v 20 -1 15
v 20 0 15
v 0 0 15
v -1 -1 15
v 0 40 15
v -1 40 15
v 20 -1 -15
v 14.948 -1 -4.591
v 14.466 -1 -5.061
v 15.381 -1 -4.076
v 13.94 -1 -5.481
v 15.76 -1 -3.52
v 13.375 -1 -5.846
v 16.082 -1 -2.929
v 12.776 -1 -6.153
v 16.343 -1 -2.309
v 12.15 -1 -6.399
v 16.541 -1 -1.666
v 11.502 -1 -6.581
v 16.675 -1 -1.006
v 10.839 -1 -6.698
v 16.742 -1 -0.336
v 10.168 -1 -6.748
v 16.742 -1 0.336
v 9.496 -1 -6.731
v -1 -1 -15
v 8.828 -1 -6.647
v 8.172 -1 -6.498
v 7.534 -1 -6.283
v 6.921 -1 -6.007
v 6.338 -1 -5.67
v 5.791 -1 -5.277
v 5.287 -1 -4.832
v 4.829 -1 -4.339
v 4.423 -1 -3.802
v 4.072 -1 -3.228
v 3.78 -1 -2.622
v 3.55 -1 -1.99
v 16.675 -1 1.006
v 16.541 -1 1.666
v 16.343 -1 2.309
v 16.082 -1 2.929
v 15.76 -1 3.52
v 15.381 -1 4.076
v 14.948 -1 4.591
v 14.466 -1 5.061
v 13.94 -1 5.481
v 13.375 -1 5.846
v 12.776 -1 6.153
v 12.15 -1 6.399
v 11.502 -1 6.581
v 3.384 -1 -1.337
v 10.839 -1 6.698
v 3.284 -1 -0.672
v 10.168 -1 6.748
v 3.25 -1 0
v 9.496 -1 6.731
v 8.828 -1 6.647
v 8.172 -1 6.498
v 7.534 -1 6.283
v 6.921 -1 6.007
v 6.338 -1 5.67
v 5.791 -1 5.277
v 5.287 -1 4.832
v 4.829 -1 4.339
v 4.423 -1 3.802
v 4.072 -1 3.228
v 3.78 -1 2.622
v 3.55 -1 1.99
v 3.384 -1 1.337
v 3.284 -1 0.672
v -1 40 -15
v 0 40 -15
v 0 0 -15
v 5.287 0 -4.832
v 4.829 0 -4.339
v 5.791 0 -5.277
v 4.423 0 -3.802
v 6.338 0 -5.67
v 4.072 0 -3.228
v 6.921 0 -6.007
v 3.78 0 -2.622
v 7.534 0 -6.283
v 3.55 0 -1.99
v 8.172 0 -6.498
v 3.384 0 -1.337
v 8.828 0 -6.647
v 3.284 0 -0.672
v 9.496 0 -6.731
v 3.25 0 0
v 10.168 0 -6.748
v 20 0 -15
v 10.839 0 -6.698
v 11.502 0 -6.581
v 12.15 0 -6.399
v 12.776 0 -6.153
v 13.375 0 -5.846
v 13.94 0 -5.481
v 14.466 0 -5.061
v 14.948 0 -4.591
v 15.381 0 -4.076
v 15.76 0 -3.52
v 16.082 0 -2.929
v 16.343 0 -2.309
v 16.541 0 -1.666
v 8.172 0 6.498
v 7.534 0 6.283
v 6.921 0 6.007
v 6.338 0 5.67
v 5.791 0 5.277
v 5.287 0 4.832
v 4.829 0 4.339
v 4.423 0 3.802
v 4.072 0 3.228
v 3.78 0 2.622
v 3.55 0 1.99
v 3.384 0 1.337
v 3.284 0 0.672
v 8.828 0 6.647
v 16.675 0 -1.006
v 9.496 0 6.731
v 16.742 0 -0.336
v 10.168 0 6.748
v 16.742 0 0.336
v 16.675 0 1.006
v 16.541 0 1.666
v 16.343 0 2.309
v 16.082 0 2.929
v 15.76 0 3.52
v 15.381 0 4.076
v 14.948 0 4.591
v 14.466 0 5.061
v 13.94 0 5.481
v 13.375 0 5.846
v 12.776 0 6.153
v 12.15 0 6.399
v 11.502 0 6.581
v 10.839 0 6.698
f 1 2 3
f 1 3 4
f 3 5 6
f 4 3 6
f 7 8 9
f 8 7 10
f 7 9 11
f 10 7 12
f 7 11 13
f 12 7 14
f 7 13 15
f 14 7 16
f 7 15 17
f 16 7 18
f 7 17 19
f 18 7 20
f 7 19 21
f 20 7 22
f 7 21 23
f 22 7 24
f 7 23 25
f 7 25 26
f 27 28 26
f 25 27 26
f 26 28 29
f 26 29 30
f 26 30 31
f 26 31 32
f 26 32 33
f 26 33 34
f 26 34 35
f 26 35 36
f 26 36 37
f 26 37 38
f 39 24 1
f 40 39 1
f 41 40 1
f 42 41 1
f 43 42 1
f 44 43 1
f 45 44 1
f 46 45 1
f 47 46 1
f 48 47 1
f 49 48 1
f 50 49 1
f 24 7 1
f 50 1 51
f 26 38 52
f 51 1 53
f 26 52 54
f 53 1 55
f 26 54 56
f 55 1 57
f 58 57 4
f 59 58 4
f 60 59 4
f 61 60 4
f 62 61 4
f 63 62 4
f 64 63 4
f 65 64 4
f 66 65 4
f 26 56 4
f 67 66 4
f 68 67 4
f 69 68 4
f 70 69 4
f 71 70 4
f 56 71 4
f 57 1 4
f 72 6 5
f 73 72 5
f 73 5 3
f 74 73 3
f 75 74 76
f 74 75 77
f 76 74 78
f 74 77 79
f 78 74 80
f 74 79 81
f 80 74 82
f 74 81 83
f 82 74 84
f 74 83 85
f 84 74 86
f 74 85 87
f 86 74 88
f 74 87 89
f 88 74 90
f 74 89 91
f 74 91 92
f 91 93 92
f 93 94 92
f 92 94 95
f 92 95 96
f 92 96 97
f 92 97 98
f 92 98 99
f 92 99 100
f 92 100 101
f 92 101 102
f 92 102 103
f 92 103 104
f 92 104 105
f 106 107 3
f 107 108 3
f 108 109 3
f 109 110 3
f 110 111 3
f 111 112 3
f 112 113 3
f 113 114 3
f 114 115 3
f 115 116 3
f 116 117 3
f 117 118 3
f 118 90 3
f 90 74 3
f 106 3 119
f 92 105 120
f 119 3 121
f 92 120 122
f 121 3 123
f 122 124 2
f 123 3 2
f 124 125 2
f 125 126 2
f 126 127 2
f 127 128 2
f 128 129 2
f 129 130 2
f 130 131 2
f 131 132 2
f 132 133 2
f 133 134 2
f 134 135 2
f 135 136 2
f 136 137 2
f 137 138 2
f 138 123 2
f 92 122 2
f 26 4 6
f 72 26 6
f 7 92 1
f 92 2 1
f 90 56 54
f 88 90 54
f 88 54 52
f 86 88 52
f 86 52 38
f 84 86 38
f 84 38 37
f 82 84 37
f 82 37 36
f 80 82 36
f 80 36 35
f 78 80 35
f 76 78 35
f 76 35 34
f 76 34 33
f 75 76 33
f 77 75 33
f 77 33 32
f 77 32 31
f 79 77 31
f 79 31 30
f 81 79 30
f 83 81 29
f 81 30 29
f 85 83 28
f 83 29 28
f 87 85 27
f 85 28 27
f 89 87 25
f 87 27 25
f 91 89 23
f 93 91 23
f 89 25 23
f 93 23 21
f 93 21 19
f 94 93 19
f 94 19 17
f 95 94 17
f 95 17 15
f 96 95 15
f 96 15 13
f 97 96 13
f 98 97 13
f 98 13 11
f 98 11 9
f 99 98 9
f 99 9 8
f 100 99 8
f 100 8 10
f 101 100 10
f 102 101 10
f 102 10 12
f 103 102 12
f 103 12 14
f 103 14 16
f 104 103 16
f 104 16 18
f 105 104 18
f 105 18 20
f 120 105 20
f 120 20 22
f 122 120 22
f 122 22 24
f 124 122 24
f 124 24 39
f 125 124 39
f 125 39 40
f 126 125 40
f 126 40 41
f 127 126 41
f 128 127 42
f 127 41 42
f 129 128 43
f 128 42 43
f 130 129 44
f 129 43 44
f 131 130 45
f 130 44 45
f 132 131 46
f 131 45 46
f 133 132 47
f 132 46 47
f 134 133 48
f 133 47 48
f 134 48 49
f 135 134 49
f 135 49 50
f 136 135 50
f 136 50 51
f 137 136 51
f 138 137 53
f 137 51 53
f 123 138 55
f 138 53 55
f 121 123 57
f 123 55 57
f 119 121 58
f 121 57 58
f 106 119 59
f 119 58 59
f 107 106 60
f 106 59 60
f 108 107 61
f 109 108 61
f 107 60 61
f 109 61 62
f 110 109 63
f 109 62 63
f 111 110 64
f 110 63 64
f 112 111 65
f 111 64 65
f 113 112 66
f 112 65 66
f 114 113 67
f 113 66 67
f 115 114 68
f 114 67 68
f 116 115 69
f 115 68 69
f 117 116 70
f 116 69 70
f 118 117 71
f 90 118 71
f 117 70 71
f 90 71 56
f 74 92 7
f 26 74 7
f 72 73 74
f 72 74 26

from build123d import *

# Parameters (mm, degrees)
EXTRUDE_THIN1_DEPTH       = 15
M12_CLEARANCE_SLOT1_D     = 13.5
M12_CLEARANCE_SLOT1_DEPTH = 1


with BuildPart() as part:
    # Sketch1 → Extrude-Thin1 (new body, symmetric)
    with BuildSketch(Plane.XY):
        Polygon((0, 40), (0, 0), (20, 0), (20, -1), (-1, -1), (-1, 40), align=None)
    extrude(amount=EXTRUDE_THIN1_DEPTH, both=True)

    # M12 Clearance Slot1
    with Locations(Plane(origin=(0, 0, 0), x_dir=(1, 0, 0), z_dir=(0, 1, 0))):
        with Locations((10, 0)):
            Hole(M12_CLEARANCE_SLOT1_D / 2, depth=M12_CLEARANCE_SLOT1_DEPTH)


solid = part.part
